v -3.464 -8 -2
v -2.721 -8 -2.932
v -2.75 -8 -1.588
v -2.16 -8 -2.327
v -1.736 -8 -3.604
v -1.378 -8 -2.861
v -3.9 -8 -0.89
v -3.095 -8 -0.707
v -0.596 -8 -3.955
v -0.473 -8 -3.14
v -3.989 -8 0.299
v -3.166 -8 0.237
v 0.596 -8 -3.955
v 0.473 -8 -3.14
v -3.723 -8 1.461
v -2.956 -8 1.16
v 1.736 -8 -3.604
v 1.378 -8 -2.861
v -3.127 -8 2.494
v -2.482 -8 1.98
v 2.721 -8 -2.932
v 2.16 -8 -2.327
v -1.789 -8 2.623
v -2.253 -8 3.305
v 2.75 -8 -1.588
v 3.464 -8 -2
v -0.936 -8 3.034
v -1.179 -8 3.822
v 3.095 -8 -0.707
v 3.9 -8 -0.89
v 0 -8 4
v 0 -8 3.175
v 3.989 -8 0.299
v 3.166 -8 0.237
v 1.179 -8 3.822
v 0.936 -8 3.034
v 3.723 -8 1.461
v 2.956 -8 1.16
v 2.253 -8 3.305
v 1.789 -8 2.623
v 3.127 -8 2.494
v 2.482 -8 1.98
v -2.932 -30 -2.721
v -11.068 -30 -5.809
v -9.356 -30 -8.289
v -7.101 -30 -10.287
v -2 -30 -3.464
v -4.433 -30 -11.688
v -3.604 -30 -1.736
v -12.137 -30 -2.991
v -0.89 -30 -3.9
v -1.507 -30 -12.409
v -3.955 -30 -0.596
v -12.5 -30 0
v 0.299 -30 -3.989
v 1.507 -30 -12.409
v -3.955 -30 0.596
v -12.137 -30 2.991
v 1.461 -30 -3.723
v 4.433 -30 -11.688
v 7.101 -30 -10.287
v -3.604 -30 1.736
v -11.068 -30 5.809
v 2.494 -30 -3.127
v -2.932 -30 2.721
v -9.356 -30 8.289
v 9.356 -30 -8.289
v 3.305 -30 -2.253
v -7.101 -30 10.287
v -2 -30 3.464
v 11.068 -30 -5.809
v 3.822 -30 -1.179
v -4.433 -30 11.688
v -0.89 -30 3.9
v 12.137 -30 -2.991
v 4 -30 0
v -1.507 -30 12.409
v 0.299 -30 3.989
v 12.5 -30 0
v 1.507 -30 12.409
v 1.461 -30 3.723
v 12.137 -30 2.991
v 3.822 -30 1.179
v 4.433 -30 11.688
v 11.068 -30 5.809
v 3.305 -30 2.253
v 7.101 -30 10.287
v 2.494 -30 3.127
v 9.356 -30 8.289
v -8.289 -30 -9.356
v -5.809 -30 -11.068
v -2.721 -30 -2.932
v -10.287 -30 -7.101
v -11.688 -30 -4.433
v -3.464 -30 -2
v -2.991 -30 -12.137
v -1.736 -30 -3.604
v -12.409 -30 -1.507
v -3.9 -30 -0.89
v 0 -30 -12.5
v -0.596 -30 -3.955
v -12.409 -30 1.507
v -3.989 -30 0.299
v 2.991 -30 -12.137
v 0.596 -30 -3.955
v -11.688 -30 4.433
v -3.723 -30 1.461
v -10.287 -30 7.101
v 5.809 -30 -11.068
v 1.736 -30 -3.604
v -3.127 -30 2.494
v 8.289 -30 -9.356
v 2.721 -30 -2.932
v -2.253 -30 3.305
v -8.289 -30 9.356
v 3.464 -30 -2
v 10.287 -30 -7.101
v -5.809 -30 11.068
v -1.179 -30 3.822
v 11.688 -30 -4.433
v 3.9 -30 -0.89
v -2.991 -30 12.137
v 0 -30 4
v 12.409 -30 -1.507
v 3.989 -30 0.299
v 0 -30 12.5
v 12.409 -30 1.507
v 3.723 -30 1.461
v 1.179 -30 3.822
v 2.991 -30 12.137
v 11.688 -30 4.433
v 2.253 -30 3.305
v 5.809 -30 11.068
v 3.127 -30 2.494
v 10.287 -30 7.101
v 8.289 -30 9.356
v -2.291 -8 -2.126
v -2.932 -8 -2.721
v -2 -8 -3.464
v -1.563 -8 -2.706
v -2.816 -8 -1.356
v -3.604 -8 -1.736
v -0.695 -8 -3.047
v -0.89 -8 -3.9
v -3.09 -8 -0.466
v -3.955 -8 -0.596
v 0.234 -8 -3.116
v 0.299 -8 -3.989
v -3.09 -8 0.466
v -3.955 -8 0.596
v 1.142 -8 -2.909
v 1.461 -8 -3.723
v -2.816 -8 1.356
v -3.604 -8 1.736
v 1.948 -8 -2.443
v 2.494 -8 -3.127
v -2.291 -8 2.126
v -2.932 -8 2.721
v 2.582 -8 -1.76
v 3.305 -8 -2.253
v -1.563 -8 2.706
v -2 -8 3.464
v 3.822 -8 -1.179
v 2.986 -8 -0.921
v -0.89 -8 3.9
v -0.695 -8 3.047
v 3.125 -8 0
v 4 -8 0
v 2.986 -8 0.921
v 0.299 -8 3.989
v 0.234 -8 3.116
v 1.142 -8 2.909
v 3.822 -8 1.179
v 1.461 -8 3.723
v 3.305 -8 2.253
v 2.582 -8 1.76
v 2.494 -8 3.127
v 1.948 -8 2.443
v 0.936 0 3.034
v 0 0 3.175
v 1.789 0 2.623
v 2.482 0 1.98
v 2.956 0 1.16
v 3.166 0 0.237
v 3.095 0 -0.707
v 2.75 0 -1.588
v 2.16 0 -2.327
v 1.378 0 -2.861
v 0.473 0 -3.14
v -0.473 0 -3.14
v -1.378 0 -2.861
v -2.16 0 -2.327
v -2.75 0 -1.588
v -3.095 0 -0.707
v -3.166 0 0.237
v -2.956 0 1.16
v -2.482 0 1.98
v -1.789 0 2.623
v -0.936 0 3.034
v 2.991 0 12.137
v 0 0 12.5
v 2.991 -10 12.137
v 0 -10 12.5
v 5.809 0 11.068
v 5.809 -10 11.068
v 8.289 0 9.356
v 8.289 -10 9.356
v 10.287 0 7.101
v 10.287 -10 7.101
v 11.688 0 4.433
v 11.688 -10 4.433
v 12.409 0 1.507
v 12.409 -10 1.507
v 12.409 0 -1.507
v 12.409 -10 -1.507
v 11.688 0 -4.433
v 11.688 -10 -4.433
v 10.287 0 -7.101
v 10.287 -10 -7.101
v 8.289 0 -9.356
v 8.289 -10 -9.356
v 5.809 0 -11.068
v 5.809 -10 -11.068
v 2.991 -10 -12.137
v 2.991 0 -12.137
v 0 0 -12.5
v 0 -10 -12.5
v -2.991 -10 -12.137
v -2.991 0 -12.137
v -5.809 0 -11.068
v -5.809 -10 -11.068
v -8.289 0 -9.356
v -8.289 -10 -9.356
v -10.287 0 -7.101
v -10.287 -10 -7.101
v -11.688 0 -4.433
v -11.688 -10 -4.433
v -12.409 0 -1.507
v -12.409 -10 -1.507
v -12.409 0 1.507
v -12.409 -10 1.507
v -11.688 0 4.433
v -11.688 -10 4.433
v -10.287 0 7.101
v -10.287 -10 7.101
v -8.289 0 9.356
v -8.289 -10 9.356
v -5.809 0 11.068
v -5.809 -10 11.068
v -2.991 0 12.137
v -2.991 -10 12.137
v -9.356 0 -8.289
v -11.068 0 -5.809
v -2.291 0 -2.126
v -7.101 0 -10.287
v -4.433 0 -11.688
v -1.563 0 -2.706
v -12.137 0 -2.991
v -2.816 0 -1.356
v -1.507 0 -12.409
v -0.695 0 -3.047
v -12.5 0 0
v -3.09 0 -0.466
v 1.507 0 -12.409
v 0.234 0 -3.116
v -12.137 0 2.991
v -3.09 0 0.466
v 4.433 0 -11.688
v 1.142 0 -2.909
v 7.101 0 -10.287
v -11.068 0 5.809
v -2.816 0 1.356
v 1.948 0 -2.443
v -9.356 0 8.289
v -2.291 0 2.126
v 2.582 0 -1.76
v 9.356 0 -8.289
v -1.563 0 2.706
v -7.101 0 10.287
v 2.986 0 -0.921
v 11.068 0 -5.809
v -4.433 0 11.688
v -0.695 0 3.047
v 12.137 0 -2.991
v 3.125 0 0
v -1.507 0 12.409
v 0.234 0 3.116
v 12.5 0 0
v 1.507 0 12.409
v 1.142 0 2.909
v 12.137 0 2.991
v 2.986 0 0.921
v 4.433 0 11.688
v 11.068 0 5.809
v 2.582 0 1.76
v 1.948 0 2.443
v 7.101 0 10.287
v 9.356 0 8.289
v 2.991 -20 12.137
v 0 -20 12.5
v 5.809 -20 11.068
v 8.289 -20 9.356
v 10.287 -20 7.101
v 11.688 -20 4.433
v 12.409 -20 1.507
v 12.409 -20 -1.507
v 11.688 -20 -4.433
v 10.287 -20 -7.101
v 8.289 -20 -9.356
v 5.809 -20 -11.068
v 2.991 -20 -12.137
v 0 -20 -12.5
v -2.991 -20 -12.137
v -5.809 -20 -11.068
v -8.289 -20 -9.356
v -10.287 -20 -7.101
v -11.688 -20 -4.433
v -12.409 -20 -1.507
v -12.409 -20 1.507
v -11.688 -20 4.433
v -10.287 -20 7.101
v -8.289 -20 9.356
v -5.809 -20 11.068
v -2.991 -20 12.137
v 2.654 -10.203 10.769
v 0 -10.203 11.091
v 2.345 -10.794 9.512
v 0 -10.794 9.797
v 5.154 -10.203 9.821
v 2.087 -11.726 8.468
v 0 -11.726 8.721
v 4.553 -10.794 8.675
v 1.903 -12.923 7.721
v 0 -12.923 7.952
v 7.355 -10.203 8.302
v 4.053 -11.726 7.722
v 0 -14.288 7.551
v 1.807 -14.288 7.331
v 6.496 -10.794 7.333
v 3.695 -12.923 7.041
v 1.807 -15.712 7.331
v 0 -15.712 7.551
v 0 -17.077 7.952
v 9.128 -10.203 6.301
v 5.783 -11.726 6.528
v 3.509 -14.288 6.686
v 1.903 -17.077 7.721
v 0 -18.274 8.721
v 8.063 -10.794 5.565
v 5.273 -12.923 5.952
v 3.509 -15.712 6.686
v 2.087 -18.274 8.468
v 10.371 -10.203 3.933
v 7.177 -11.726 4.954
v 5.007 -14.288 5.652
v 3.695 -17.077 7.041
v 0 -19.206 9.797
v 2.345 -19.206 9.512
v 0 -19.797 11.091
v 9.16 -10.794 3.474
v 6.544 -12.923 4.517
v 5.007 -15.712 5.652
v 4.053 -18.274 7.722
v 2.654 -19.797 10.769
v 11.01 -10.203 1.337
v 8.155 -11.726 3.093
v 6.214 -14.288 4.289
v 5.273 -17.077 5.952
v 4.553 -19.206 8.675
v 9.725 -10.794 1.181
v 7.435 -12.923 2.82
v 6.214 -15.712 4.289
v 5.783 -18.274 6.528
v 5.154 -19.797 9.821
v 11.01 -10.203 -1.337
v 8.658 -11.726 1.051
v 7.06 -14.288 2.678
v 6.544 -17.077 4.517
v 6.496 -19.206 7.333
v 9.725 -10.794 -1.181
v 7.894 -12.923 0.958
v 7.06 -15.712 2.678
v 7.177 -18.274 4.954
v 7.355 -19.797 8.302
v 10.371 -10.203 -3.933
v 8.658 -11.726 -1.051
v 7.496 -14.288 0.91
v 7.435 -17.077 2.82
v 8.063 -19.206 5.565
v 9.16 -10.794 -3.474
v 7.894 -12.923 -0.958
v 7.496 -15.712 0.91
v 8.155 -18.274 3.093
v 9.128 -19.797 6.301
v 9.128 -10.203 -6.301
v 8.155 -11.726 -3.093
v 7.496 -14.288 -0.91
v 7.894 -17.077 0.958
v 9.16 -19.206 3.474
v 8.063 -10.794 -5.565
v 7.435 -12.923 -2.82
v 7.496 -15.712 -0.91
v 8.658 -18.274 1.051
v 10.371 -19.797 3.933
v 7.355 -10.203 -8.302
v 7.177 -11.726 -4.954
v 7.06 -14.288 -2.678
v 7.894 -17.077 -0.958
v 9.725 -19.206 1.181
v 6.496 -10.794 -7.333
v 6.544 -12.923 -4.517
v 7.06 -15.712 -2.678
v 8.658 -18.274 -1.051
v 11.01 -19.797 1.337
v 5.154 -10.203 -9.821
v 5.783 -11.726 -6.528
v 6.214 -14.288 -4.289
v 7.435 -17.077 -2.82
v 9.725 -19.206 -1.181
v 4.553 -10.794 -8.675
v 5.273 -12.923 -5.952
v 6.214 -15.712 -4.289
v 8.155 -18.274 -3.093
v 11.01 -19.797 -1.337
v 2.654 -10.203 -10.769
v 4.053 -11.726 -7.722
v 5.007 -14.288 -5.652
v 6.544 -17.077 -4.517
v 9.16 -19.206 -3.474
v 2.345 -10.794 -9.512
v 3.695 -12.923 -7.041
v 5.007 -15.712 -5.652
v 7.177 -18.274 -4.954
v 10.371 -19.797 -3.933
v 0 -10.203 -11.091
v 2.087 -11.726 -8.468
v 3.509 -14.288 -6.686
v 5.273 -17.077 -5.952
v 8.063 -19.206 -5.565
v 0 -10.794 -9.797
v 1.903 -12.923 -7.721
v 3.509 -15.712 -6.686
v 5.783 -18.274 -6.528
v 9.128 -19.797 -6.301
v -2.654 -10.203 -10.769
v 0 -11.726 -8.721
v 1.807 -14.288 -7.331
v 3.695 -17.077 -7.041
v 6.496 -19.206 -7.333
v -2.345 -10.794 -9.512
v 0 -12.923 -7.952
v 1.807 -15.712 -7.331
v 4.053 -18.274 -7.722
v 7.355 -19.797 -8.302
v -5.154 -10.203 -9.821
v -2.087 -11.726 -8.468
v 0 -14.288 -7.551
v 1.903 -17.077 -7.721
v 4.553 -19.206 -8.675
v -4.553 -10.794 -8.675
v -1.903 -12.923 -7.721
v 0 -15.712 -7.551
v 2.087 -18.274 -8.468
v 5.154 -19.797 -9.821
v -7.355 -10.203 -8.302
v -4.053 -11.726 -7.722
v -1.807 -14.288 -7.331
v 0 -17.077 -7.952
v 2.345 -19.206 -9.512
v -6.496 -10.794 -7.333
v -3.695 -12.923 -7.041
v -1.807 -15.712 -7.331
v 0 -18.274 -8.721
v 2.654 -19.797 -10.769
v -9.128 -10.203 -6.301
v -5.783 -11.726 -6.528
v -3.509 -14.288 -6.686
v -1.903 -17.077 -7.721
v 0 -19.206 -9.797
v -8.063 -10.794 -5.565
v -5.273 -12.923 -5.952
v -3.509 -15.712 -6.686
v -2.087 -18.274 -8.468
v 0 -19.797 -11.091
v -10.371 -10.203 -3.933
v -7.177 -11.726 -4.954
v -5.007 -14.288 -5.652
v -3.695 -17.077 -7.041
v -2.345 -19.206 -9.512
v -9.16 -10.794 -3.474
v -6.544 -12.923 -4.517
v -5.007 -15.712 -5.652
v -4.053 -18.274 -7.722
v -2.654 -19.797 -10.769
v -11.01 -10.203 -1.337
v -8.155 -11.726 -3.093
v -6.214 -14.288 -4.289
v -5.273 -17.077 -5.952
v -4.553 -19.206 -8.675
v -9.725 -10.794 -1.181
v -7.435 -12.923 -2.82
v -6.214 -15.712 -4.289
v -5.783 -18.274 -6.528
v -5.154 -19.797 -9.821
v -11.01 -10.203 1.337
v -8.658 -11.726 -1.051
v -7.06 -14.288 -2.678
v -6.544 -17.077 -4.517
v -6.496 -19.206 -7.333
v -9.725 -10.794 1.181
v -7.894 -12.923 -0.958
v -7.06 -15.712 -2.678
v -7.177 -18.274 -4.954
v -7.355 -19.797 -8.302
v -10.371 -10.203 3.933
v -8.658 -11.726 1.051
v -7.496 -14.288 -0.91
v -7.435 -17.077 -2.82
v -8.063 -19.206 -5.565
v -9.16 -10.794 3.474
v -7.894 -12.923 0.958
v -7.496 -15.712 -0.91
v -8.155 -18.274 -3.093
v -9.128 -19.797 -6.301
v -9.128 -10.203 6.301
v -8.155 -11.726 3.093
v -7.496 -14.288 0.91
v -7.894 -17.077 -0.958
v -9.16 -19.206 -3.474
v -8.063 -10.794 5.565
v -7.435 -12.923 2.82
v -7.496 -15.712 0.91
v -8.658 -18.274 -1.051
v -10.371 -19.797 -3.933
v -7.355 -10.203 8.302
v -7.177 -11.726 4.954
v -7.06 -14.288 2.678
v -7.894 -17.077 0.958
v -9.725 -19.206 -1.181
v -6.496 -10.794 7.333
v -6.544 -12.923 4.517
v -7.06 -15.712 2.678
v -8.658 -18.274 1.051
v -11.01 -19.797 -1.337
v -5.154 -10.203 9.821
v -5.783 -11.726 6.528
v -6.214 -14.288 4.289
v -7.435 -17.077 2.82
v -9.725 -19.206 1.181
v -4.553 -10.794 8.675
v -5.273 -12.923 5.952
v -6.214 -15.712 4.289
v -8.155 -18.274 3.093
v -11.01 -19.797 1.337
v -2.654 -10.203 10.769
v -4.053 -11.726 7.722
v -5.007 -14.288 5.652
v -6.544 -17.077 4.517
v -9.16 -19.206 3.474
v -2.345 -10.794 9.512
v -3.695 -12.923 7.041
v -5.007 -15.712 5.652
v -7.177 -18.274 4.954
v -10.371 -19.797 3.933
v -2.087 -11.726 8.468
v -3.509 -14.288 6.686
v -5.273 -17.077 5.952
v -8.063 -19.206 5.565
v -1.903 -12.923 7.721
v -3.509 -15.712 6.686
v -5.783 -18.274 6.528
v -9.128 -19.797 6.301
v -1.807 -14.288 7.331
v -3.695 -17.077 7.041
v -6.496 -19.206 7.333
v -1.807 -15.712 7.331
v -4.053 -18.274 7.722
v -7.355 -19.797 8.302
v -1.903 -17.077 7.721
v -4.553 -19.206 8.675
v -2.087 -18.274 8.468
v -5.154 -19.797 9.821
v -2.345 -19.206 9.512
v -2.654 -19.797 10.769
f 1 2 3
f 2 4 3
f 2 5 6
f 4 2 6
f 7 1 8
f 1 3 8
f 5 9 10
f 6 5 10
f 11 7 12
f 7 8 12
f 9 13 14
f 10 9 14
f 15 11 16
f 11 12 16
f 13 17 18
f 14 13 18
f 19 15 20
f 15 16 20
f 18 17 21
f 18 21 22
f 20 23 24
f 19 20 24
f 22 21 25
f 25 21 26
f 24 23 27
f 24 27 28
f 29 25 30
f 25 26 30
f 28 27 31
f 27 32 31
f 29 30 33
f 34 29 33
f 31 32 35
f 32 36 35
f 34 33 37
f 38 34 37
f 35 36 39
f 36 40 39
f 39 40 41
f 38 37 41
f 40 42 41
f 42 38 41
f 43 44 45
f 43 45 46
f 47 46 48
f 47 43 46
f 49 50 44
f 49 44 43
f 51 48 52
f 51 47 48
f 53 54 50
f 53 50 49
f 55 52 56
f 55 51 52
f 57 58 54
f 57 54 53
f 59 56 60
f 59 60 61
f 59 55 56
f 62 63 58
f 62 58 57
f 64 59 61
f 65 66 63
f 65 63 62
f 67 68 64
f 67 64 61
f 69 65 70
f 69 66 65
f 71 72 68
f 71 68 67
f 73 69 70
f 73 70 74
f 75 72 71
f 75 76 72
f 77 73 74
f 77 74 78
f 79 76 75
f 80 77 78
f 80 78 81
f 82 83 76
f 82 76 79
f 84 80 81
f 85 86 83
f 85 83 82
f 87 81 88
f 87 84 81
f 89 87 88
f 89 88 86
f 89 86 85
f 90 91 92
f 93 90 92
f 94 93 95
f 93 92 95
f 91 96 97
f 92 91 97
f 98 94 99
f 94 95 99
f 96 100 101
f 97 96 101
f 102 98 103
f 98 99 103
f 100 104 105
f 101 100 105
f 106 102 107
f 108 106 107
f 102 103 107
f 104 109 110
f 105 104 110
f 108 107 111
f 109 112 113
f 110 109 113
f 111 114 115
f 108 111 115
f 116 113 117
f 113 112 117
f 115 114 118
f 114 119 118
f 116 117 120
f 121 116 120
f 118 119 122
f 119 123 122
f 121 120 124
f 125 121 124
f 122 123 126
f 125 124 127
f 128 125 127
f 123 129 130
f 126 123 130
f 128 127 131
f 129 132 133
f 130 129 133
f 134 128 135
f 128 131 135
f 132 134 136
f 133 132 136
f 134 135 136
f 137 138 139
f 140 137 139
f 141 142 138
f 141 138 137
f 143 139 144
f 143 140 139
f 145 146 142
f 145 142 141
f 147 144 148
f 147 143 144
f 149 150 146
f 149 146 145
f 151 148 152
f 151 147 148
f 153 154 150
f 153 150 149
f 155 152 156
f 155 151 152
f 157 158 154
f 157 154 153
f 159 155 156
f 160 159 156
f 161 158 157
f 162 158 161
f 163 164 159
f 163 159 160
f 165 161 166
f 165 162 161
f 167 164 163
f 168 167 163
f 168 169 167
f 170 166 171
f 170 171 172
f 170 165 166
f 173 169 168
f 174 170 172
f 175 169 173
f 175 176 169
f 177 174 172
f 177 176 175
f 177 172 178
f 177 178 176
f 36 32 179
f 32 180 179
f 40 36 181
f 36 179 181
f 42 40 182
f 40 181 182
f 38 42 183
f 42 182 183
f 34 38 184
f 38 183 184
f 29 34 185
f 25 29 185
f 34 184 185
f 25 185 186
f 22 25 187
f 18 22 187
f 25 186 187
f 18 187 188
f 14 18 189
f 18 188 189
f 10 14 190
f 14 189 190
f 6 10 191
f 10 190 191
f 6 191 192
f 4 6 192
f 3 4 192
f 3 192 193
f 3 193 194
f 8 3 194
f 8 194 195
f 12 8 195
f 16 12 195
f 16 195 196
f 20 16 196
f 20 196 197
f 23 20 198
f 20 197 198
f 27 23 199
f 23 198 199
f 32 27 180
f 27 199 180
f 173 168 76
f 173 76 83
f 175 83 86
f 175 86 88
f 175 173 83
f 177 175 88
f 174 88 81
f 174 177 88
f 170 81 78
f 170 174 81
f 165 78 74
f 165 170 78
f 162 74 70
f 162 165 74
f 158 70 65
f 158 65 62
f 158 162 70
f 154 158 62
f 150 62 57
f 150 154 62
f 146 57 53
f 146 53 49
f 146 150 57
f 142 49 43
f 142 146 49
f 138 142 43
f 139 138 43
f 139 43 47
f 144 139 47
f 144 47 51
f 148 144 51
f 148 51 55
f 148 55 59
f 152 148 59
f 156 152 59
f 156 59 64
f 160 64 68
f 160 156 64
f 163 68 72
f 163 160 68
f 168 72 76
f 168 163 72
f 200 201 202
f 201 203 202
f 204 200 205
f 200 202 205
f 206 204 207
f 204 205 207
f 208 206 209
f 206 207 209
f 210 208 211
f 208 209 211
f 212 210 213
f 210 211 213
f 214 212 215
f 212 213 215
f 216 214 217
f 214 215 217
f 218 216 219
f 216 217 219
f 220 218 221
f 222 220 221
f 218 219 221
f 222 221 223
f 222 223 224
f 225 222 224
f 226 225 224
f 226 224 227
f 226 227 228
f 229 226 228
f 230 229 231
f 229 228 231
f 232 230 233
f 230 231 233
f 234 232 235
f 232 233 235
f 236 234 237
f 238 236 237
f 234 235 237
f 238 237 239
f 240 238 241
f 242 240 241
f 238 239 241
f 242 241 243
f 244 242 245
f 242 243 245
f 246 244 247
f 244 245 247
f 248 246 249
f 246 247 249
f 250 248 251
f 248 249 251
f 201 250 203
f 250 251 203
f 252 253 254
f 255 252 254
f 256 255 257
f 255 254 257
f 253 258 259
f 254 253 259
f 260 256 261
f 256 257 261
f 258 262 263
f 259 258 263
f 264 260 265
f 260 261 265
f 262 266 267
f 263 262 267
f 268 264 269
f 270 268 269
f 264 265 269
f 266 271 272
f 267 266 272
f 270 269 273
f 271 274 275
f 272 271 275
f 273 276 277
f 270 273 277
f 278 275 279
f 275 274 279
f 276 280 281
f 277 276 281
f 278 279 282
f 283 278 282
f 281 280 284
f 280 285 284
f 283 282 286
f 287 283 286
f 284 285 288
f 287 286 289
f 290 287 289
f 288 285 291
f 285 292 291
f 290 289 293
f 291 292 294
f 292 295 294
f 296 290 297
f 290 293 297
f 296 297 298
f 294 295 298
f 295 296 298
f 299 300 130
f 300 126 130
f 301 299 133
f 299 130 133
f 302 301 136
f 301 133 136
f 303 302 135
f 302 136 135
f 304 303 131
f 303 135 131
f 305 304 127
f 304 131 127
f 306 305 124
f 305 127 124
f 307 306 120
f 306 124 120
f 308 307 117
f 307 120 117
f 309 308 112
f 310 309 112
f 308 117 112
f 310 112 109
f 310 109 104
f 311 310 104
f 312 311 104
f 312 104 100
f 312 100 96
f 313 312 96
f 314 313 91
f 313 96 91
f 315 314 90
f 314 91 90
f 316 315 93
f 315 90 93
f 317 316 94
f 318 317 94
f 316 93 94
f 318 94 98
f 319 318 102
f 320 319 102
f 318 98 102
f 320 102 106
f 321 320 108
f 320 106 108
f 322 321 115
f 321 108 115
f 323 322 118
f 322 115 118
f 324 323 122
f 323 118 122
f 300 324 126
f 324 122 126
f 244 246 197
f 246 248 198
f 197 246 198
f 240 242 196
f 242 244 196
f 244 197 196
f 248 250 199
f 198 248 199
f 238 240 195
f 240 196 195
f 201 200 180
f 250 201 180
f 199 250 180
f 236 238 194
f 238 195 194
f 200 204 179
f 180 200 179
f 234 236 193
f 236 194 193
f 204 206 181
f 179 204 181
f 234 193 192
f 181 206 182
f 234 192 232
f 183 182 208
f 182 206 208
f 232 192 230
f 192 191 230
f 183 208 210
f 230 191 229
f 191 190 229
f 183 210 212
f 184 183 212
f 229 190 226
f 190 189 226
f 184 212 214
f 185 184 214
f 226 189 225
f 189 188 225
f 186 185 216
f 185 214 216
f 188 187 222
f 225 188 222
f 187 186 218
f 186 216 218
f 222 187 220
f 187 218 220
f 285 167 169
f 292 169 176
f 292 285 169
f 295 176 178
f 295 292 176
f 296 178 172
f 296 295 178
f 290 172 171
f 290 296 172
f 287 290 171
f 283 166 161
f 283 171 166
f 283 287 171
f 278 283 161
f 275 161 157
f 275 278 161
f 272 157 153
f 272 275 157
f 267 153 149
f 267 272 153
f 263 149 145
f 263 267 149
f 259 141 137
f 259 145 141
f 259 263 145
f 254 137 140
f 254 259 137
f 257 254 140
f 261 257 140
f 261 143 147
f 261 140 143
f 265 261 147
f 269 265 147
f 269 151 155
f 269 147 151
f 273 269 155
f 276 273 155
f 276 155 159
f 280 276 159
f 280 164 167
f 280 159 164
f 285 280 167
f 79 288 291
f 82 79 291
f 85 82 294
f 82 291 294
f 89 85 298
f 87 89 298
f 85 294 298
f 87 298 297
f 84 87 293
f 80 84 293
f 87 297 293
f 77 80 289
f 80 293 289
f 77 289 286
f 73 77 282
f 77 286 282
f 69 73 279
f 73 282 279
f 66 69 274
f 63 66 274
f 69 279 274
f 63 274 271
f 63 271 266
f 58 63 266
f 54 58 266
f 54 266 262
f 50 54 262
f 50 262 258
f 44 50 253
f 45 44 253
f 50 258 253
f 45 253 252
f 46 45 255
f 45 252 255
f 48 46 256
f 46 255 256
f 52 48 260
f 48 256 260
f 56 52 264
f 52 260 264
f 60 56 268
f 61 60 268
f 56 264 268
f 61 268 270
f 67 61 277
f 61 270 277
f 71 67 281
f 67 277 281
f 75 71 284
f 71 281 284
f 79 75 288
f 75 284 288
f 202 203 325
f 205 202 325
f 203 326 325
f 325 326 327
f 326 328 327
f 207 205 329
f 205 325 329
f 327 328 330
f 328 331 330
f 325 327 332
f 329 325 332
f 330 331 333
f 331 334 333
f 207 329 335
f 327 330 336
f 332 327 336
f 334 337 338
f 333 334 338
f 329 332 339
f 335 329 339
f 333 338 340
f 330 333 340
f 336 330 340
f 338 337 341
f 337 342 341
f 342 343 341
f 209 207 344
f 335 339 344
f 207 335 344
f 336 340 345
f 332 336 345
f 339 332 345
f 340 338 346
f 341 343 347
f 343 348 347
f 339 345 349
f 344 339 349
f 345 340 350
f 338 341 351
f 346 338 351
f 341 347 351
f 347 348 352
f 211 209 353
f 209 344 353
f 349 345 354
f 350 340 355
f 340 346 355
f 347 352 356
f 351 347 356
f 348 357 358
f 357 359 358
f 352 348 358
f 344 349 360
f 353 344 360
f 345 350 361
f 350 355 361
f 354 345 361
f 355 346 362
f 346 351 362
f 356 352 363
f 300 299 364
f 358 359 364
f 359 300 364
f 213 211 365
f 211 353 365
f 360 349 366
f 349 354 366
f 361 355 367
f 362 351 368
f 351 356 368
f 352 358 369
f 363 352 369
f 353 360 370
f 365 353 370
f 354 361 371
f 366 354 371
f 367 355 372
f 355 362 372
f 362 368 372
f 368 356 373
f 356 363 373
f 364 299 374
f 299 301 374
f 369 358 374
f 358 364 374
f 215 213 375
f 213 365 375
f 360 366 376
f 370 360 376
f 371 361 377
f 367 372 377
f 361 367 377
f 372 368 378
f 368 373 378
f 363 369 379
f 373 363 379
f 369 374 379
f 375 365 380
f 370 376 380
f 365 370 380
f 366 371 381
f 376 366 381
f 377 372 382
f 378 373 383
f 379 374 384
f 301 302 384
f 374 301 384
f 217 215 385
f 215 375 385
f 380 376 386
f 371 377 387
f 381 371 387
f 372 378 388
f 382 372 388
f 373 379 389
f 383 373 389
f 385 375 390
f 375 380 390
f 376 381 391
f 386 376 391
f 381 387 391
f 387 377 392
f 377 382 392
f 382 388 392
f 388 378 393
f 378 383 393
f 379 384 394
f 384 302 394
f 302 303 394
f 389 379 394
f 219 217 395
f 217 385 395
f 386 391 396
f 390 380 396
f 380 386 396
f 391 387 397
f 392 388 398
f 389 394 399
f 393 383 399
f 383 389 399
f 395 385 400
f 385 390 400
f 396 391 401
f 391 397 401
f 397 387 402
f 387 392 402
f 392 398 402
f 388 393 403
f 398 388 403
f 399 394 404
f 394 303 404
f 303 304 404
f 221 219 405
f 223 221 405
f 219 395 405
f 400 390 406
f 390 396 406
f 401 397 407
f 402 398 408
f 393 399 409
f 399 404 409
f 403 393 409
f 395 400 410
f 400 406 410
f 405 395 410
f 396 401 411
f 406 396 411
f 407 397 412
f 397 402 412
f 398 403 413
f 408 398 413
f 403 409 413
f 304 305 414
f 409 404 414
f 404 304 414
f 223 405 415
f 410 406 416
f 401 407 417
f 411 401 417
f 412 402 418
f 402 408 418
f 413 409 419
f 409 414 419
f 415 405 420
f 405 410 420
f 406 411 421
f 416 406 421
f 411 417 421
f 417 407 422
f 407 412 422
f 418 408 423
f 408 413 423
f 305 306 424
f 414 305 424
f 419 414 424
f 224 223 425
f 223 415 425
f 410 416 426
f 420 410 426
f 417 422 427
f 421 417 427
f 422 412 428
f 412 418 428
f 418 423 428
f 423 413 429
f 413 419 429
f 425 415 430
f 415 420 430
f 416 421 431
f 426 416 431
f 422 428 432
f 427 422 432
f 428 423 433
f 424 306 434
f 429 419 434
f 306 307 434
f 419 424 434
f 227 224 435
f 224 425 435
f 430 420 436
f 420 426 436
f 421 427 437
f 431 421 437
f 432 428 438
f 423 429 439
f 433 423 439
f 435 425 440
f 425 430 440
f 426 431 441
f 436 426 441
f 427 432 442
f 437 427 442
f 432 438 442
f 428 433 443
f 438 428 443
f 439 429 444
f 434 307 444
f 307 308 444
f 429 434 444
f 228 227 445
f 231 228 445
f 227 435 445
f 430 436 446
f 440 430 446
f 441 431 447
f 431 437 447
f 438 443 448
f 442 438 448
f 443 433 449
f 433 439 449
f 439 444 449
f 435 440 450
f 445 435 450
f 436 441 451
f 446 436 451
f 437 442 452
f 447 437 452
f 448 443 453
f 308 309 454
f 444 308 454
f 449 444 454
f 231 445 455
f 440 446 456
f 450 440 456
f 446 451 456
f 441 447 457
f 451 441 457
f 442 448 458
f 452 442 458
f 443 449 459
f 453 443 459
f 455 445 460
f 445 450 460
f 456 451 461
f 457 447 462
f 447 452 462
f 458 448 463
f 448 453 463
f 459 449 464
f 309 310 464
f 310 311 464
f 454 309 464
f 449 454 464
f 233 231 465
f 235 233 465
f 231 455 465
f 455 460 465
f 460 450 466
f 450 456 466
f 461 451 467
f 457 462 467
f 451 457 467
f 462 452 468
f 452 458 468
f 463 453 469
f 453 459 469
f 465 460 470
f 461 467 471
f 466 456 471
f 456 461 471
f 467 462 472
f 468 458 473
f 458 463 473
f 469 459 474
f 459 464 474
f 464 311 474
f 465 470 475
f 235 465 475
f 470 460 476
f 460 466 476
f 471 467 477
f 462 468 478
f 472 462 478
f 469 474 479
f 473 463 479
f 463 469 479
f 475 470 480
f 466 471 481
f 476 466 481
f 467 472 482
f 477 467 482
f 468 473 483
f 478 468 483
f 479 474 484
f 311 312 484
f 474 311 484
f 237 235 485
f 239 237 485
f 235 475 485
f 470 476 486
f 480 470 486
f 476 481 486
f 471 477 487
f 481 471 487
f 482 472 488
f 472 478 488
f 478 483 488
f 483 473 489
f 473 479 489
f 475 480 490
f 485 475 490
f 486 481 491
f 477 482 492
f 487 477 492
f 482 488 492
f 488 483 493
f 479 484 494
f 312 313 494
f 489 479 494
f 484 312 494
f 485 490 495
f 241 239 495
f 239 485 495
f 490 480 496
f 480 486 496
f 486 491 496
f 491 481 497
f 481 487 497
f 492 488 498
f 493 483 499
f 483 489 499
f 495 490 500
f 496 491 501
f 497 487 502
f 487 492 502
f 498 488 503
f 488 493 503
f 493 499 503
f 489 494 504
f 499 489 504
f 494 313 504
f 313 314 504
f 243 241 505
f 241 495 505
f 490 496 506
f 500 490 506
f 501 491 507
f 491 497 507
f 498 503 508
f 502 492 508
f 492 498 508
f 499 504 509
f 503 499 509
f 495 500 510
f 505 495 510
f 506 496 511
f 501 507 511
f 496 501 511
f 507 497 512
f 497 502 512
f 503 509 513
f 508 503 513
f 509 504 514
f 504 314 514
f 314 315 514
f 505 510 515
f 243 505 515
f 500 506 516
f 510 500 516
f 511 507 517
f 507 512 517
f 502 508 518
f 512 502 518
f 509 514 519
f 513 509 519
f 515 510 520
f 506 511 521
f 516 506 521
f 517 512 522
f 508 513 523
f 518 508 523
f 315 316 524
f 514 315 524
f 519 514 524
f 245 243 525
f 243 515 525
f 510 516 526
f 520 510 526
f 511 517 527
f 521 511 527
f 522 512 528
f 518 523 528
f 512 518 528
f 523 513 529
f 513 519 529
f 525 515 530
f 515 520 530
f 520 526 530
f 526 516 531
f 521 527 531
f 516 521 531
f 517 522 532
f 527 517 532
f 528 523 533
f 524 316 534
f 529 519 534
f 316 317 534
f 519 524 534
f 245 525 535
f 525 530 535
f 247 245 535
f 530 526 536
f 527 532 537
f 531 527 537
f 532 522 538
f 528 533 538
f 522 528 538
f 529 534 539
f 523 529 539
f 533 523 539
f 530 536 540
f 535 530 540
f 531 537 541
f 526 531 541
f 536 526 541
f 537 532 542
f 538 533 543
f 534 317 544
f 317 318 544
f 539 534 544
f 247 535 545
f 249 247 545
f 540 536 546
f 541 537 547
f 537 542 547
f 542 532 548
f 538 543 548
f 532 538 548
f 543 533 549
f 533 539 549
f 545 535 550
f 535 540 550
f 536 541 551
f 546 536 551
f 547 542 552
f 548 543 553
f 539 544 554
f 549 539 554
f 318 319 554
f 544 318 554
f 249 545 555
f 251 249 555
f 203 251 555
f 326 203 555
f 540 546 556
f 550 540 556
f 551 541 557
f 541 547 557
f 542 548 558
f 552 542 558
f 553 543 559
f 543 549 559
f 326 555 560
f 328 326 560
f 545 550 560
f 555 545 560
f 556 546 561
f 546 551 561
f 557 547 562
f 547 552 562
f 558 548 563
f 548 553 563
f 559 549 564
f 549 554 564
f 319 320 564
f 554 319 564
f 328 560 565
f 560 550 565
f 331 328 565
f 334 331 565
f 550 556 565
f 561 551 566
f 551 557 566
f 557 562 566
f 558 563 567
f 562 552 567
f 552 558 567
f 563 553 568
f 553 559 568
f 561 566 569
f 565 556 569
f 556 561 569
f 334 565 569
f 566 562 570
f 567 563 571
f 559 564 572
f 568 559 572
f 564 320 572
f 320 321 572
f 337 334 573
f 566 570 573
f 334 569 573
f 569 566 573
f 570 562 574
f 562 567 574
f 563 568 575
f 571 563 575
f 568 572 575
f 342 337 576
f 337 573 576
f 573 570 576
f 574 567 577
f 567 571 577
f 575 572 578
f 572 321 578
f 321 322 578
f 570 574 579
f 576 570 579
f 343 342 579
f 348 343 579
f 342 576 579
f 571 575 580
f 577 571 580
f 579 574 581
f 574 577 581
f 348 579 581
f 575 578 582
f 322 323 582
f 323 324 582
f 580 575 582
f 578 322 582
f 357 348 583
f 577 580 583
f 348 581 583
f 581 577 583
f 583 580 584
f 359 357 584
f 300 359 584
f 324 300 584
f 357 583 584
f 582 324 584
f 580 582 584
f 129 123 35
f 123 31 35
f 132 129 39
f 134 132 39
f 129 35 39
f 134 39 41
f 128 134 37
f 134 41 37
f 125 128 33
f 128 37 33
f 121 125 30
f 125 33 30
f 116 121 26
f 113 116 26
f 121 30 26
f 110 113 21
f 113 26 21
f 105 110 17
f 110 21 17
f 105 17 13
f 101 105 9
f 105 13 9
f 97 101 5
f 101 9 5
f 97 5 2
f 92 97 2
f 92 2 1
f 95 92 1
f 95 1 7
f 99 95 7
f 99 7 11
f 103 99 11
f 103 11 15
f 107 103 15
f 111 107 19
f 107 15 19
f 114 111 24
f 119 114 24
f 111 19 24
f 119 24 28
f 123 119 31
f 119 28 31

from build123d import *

# Parameters (mm, degrees)
F0_R     = 12.5
F0_R_2   = 3.125
F1_DEPTH = 30
F3_R     = 4
F4_DEPTH = 22


with BuildPart() as f1:
    # F0 (on Front) → F1 (new body)
    with BuildSketch(Plane.XZ):
        Circle(F0_R)
        Circle(F0_R_2, mode=Mode.SUBTRACT)
    extrude(amount=F1_DEPTH)

    # F3 (on offset) → F4 (cut, through all)
    with BuildSketch(Plane.XZ.offset(8)):
        Circle(F3_R)
    extrude(amount=F4_DEPTH, mode=Mode.SUBTRACT)


with BuildPart() as f6:
    # F5 (on Right) → F6 (revolve)
    with BuildSketch(Plane.YZ):
        with BuildLine():
            Line((-20, 12.5), (-30, 12.5))
            Line((-30, 12.5), (-30, 4))
            Line((-30, 4), (-8, 4))
            Line((-8, 4), (-8, 3.175))
            Line((-8, 3.175), (0, 3.175))
            Line((0, 3.175), (0, 12.5))
            Line((0, 12.5), (-10, 12.5))
            ThreePointArc((-10, 12.5), (-15, 7.5), (-20, 12.5))
        make_face()
    revolve(axis=Axis((0, -15.032032, 0), (0, 1, 0)))


solid = Compound([f1.part, f6.part])
